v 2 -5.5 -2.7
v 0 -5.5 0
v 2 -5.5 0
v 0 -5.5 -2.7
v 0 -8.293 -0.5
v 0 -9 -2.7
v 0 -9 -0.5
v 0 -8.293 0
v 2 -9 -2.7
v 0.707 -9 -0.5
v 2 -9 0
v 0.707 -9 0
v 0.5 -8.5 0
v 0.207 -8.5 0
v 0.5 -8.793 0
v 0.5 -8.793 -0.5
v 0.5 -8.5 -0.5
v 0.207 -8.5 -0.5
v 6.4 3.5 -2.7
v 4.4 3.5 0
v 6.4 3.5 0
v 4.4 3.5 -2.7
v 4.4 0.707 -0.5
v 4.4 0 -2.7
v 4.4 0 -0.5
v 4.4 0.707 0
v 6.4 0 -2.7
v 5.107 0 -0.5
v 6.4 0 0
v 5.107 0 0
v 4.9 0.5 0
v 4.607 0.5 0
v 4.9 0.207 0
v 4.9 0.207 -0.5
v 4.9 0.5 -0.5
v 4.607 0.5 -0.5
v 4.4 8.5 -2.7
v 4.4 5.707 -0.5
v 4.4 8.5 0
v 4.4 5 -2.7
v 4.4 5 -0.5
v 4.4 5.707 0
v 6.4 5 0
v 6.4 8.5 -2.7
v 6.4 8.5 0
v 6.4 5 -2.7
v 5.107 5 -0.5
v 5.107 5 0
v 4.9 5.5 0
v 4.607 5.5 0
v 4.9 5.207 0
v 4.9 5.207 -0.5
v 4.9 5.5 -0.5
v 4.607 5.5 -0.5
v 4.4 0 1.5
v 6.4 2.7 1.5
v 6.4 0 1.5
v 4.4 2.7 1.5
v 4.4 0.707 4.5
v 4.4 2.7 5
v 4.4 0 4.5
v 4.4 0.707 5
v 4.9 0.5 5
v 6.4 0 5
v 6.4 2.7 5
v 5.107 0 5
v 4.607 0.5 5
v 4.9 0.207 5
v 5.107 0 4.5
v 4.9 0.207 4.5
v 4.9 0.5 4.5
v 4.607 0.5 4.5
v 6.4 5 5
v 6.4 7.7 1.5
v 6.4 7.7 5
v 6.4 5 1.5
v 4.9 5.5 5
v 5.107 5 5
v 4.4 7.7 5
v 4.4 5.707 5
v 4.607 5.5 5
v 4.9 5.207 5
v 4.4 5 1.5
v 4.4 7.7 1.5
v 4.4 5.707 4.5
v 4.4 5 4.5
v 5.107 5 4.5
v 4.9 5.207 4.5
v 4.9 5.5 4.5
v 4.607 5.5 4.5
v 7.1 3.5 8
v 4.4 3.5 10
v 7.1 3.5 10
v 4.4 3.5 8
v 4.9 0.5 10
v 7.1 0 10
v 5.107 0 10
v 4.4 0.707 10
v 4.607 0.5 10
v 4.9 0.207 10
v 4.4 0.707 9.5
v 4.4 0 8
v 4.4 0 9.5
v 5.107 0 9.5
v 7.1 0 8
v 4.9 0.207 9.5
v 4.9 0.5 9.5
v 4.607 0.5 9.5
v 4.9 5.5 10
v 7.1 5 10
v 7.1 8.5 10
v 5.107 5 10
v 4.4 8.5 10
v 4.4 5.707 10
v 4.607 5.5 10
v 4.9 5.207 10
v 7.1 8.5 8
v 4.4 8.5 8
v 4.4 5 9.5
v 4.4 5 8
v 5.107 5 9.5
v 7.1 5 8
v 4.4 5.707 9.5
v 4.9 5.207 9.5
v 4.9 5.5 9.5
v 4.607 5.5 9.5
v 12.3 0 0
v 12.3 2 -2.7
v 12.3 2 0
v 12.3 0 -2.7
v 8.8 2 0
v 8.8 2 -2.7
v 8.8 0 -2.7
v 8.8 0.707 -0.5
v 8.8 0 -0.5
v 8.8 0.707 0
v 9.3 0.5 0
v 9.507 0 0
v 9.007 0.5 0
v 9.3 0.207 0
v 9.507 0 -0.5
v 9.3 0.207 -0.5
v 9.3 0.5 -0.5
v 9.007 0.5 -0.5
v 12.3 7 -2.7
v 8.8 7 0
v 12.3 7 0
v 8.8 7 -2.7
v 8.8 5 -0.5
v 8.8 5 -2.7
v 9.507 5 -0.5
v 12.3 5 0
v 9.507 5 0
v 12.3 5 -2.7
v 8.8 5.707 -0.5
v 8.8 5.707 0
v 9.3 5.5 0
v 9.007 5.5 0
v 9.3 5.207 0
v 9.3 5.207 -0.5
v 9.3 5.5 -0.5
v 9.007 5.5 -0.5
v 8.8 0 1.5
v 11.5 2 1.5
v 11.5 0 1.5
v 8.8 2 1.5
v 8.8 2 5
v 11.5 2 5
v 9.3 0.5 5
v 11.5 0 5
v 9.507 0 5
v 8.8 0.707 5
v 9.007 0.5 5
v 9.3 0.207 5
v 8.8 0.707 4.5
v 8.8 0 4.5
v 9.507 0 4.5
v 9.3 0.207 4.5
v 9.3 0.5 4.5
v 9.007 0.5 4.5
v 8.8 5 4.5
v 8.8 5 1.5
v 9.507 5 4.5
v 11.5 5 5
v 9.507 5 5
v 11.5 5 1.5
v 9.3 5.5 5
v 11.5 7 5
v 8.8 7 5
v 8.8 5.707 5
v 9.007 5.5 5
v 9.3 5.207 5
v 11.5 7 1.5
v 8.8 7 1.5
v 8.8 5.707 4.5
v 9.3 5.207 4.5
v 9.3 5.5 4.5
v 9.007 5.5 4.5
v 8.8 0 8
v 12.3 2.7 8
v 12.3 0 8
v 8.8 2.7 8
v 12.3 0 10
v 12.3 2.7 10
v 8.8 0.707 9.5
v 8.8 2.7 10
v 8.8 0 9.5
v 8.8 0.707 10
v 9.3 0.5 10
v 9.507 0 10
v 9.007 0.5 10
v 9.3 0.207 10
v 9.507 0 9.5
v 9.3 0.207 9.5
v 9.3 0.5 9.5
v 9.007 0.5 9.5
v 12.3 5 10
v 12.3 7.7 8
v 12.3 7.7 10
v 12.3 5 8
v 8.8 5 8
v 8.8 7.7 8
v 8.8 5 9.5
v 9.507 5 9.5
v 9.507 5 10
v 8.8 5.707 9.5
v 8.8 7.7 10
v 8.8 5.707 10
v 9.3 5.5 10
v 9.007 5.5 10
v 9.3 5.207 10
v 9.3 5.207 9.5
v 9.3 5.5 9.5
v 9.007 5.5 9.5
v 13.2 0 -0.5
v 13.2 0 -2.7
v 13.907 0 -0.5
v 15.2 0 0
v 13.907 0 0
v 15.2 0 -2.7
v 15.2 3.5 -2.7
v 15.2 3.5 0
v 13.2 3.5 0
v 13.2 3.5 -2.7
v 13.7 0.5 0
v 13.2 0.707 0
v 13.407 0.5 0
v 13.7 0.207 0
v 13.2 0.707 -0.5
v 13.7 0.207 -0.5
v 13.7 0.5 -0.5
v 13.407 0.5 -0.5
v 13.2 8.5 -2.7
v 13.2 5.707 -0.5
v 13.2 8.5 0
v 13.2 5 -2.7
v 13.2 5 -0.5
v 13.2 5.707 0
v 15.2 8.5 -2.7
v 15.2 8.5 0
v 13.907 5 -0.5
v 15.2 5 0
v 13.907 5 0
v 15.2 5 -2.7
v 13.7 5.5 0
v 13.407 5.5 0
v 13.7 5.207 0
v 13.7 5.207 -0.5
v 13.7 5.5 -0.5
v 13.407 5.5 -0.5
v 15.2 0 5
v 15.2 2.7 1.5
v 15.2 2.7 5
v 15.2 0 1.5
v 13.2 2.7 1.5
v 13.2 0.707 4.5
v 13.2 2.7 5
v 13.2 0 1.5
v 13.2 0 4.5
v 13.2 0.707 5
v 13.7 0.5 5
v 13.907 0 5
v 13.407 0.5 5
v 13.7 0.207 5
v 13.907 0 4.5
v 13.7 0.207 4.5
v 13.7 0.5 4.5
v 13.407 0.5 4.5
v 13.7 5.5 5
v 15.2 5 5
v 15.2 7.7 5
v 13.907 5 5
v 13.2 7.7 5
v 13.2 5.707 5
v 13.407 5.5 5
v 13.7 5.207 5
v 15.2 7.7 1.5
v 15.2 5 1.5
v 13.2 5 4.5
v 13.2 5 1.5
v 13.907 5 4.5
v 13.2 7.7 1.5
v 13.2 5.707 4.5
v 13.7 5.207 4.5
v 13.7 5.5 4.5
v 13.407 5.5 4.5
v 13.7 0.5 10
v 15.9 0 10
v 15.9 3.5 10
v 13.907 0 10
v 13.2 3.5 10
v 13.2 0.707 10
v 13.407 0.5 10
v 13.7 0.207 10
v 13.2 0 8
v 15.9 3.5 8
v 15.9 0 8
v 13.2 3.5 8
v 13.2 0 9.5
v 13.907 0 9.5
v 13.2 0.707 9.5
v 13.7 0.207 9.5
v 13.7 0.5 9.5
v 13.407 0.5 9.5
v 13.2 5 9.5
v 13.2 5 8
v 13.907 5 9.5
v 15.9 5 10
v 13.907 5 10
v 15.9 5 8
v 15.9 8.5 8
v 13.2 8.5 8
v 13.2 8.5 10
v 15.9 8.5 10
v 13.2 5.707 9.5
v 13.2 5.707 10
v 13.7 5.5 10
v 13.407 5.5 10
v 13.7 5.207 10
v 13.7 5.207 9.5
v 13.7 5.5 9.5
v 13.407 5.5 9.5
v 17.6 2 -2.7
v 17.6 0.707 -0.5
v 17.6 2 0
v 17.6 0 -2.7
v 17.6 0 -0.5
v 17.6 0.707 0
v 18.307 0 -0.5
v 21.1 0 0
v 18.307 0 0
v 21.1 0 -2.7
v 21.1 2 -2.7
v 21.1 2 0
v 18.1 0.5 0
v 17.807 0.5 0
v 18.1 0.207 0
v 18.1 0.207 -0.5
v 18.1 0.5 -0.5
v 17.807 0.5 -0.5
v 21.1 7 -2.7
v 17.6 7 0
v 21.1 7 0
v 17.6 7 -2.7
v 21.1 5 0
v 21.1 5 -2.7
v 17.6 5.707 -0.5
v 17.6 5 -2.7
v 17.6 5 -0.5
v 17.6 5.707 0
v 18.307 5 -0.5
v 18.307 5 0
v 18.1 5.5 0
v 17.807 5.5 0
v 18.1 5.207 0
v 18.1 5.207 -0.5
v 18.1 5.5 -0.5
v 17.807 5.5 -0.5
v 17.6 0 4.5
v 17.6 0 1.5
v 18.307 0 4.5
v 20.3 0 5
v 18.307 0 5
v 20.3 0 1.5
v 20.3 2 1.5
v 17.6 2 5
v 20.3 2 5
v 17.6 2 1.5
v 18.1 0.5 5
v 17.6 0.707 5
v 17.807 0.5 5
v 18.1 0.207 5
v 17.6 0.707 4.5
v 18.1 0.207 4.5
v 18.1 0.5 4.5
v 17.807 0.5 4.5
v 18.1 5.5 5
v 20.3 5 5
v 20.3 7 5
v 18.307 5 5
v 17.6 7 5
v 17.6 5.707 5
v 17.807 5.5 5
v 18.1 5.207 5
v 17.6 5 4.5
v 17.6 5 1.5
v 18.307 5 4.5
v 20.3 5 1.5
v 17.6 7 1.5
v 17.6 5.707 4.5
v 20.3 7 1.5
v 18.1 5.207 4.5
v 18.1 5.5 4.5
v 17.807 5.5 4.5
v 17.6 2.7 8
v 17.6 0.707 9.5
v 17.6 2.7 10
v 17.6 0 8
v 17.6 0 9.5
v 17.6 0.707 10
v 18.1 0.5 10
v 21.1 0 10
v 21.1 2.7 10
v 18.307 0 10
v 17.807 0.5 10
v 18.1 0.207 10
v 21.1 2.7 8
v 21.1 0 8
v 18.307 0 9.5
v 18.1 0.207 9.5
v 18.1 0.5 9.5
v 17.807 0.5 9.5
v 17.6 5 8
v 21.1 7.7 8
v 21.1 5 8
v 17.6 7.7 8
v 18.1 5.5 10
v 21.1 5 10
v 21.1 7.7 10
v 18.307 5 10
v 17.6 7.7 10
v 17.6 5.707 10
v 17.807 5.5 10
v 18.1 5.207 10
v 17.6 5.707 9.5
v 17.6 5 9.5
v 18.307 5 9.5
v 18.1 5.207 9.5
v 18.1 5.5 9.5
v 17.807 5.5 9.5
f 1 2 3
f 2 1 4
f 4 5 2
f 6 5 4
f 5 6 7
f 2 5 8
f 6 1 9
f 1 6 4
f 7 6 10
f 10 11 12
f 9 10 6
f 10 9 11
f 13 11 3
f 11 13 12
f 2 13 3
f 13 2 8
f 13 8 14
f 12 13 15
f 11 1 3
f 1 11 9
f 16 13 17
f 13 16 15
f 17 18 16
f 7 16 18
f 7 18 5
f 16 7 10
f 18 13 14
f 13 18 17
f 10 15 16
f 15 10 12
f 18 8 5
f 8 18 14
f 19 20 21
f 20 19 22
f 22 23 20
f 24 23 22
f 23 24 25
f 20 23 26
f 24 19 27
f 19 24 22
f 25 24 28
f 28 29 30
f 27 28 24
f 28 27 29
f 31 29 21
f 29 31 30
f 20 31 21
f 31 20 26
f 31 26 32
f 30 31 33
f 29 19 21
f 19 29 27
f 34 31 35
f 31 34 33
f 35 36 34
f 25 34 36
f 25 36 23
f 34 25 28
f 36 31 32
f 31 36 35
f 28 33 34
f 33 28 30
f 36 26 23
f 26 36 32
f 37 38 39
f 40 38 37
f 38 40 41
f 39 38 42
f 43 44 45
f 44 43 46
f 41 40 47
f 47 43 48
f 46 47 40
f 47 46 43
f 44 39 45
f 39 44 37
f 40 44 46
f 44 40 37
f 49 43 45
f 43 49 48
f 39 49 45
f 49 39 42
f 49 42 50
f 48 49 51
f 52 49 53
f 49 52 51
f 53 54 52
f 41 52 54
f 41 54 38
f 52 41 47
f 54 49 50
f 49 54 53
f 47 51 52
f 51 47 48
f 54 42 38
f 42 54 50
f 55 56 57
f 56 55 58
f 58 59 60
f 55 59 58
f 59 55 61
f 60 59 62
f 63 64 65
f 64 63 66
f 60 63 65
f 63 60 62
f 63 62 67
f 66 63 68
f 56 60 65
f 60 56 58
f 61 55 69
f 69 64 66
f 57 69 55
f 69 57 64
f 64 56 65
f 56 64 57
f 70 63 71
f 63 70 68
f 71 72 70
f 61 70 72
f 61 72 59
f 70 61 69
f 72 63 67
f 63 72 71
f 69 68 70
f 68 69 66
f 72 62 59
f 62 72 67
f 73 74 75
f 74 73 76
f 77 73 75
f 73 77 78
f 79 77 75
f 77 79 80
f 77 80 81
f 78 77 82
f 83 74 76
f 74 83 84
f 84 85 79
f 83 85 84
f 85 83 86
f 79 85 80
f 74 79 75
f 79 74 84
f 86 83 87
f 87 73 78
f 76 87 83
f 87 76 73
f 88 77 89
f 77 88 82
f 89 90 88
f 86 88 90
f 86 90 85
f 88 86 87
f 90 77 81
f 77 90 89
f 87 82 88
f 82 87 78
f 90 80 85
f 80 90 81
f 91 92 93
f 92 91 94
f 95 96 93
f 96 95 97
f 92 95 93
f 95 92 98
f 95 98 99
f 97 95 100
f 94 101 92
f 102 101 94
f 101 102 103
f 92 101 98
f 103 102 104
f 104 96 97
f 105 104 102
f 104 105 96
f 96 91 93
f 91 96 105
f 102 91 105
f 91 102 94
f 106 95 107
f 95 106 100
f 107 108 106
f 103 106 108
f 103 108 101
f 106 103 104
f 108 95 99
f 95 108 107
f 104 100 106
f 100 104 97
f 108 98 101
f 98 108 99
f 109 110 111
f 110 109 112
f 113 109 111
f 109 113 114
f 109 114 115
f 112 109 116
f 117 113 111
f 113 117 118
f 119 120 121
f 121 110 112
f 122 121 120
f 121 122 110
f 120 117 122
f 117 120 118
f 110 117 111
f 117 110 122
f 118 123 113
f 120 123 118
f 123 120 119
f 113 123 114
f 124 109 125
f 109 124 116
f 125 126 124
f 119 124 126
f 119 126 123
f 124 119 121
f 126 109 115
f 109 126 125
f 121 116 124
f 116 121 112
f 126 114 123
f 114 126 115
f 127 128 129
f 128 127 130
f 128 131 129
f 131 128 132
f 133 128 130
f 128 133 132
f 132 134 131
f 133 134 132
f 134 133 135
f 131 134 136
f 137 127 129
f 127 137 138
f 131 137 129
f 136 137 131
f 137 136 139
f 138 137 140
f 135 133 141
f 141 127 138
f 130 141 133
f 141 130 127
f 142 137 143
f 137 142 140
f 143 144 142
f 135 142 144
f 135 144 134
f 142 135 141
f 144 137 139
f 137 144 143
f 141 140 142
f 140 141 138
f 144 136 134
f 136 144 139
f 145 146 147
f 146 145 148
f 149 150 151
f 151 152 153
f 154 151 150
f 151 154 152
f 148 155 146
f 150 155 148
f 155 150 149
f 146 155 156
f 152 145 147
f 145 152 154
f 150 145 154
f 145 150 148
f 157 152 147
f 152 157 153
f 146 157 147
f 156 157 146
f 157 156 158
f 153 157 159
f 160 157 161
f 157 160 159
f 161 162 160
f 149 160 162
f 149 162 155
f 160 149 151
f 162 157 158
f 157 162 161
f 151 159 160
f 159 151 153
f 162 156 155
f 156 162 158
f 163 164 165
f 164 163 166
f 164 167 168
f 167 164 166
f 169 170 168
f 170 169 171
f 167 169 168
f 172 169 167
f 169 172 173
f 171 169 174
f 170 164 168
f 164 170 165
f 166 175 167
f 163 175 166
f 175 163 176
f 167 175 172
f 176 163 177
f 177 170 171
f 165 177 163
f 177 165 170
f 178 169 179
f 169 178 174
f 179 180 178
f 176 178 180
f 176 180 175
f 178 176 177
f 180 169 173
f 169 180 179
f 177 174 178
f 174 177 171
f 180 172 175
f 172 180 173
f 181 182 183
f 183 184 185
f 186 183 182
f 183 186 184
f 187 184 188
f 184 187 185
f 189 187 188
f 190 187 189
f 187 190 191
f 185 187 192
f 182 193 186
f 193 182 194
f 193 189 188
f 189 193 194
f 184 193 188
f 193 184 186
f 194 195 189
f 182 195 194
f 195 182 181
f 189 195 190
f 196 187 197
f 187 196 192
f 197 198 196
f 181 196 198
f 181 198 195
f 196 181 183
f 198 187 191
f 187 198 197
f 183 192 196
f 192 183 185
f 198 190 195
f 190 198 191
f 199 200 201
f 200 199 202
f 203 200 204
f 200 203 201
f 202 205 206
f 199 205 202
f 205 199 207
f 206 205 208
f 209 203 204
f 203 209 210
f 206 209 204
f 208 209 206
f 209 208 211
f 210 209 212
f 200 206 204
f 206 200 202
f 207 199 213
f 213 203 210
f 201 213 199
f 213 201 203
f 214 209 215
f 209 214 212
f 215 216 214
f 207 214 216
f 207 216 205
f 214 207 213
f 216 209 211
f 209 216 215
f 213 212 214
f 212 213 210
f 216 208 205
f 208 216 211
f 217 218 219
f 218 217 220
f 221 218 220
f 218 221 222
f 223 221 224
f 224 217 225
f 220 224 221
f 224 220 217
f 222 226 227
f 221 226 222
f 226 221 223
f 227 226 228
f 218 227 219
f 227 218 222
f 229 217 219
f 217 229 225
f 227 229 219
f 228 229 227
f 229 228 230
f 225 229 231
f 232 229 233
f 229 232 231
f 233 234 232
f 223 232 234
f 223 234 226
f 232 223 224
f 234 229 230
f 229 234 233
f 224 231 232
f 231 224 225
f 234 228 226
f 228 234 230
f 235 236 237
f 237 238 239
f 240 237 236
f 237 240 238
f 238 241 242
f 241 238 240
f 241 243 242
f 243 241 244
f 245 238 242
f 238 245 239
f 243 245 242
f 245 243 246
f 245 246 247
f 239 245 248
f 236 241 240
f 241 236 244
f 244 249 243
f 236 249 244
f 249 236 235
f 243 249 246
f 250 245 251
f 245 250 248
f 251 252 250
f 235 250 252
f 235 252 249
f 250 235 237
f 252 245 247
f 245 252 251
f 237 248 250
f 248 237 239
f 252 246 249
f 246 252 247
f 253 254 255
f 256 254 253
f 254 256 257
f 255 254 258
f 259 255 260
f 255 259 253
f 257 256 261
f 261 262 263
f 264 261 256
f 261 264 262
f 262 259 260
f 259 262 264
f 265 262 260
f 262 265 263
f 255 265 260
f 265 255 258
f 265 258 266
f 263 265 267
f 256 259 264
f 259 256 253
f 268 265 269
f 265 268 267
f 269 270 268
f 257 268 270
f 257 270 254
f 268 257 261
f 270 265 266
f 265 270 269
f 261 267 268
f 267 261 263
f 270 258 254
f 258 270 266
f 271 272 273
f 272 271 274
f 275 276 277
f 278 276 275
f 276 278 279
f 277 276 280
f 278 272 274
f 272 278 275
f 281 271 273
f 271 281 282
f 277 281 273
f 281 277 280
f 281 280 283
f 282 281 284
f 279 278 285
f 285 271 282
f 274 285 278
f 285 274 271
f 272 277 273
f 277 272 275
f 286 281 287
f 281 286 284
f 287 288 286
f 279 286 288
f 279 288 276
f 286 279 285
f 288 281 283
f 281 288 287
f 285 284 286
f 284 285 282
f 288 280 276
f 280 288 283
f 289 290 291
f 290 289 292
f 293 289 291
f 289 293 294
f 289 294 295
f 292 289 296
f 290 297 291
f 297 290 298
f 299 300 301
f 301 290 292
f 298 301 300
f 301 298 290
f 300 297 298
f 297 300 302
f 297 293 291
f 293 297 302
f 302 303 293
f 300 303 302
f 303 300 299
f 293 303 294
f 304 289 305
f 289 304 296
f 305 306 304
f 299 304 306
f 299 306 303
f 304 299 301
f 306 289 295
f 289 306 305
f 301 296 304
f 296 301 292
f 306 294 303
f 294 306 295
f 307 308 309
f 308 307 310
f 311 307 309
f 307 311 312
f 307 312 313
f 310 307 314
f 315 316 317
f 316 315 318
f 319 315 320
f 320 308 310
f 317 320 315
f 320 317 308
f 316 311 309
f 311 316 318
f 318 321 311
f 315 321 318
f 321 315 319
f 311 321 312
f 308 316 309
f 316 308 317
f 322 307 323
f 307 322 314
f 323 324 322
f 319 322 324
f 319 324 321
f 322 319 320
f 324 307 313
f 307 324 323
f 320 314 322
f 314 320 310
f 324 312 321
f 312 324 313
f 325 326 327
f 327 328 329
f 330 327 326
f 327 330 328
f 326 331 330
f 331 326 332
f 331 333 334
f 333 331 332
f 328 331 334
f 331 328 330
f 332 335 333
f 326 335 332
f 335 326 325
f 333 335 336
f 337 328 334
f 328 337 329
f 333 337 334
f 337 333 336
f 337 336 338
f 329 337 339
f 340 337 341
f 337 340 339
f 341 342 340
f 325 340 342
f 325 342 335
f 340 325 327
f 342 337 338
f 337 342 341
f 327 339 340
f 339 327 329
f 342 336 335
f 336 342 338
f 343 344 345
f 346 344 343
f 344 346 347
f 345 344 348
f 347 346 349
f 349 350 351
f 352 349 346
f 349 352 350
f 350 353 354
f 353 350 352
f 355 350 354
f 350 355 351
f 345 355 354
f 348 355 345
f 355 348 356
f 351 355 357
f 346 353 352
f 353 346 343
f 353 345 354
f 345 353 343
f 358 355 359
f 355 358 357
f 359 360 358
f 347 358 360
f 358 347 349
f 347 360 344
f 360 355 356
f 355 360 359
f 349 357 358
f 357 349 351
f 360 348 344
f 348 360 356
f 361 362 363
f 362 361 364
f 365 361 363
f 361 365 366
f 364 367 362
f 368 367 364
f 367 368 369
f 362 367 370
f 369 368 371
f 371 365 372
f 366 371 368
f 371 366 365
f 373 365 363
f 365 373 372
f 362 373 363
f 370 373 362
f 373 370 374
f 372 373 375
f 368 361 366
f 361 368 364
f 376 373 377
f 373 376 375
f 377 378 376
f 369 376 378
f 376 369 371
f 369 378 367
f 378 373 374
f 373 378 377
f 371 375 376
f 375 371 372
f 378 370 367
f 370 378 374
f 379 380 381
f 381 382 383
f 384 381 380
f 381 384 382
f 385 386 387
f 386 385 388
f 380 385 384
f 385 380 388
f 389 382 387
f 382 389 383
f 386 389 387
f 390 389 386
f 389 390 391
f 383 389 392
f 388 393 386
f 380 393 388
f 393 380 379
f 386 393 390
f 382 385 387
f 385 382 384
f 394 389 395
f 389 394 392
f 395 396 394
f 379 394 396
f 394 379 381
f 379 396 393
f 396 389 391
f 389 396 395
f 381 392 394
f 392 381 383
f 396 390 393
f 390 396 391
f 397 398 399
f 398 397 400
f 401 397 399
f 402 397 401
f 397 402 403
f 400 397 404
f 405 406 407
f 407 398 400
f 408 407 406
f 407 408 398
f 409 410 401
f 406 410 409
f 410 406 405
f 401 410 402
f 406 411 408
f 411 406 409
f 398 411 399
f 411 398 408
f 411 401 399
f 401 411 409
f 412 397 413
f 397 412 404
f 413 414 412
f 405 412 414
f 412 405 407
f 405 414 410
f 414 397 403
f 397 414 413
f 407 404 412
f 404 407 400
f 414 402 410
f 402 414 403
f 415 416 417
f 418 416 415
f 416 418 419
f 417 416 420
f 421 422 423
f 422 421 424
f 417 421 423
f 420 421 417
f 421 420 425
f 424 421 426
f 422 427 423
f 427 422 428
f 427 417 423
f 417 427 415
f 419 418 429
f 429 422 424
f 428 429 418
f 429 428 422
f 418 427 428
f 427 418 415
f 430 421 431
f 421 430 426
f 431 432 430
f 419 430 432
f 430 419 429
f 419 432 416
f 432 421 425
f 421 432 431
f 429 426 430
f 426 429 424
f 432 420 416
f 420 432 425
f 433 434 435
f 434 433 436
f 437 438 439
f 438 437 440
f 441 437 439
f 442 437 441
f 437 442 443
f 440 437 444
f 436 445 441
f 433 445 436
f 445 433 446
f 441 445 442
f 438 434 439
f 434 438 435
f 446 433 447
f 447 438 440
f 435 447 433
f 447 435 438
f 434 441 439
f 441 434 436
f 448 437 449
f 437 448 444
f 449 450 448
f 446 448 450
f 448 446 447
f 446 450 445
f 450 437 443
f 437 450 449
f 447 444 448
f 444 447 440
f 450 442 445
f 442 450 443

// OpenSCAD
// Start: lazy_union
default_5_default_5();
// End: lazy_union

// Modules.

// 'PartMaterial undef-default - undef-default'
module default_5_default_5() {
  // 'None : _combine_solids_and_holes'
  union() {
    // 'at_r0_0'
    multmatrix(m=[[1.0, 0.0, 0.0, 0.0], [0.0, 1.0, 0.0, -9.0], [0.0, 0.0, 1.0, 0.0], [0.0, 0.0, 0.0, 1.0]]) {
      // 'at_r0_0'
      color(c=[1.0, 0.0, 0.0, 1.0]) {
        // '_combine_solids_and_holes'
        difference() {
          // 'at_r0_0 : _combine_solids_and_holes'
          union() {
            // 'outer'
            multmatrix(m=[[1.0, 0.0, 0.0, 0.0], [0.0, 0.0, 1.0, 0.0], [-0.0, -1.0, -0.0, -0.0], [0.0, 0.0, 0.0, 1.0]]) {
              // 'outer : _combine_solids_and_holes'
              union() {
                // 'outer'
                cube(size=[2.0, 2.7, 3.5]);
              }
            }
          }
          // 'at_r0_0'
          multmatrix(m=[[1.0, 0.0, 0.0, -0.5], [0.0, 1.0, 0.0, -0.5], [0.0, 0.0, 1.0, -0.5], [0.0, 0.0, 0.0, 1.0]]) {
            // 'etch1 : _combine_solids_and_holes'
            union() {
              // 'etch1'
              cube(size=[1.0, 1.0, 1.0]);
            }
          }
          // 'at_r0_0'
          multmatrix(m=[[0.7071067811865475, 0.7071067811865475, 0.0, -0.7071067811865475], [-0.7071067811865475, 0.7071067811865475, 0.0, 0.0], [0.0, 0.0, 1.0, -0.5], [0.0, 0.0, 0.0, 1.0]]) {
            // 'etch2 : _combine_solids_and_holes'
            union() {
              // 'etch2'
              cube(size=[1.0, 1.0, 1.0]);
            }
          }
        }
      }
    }
    // 'at_0_0'
    multmatrix(m=[[1.0, 0.0, 0.0, 4.4], [0.0, 1.0, 0.0, 0.0], [0.0, 0.0, 1.0, 0.0], [0.0, 0.0, 0.0, 1.0]]) {
      // 'at_0_0'
      color(c=[1.0, 0.0, 0.0, 1.0]) {
        // '_combine_solids_and_holes'
        difference() {
          // 'at_0_0 : _combine_solids_and_holes'
          union() {
            // 'outer'
            multmatrix(m=[[1.0, 0.0, 0.0, 0.0], [0.0, 0.0, 1.0, 0.0], [-0.0, -1.0, -0.0, -0.0], [0.0, 0.0, 0.0, 1.0]]) {
              // 'outer : _combine_solids_and_holes'
              union() {
                // 'outer'
                cube(size=[2.0, 2.7, 3.5]);
              }
            }
          }
          // 'at_0_0'
          multmatrix(m=[[1.0, 0.0, 0.0, -0.5], [0.0, 1.0, 0.0, -0.5], [0.0, 0.0, 1.0, -0.5], [0.0, 0.0, 0.0, 1.0]]) {
            // 'etch1 : _combine_solids_and_holes'
            union() {
              // 'etch1'
              cube(size=[1.0, 1.0, 1.0]);
            }
          }
          // 'at_0_0'
          multmatrix(m=[[0.7071067811865475, 0.7071067811865475, 0.0, -0.7071067811865475], [-0.7071067811865475, 0.7071067811865475, 0.0, 0.0], [0.0, 0.0, 1.0, -0.5], [0.0, 0.0, 0.0, 1.0]]) {
            // 'etch2 : _combine_solids_and_holes'
            union() {
              // 'etch2'
              cube(size=[1.0, 1.0, 1.0]);
            }
          }
        }
      }
    }
    // 'at_3_0'
    multmatrix(m=[[1.0, 0.0, 0.0, 4.4], [0.0, 1.0, 0.0, 5.0], [0.0, 0.0, 1.0, 0.0], [0.0, 0.0, 0.0, 1.0]]) {
      // 'at_3_0'
      color(c=[1.0, 1.0, 0.0, 1.0]) {
        // '_combine_solids_and_holes'
        difference() {
          // 'at_3_0 : _combine_solids_and_holes'
          union() {
            // 'outer'
            multmatrix(m=[[1.0, 0.0, 0.0, 0.0], [-0.0, -0.0, -1.0, 3.5], [0.0, 1.0, 0.0, -2.7], [0.0, 0.0, 0.0, 1.0]]) {
              // 'outer : _combine_solids_and_holes'
              union() {
                // 'outer'
                cube(size=[2.0, 2.7, 3.5]);
              }
            }
          }
          // 'at_3_0'
          multmatrix(m=[[1.0, 0.0, 0.0, -0.5], [0.0, 1.0, 0.0, -0.5], [0.0, 0.0, 1.0, -0.5], [0.0, 0.0, 0.0, 1.0]]) {
            // 'etch1 : _combine_solids_and_holes'
            union() {
              // 'etch1'
              cube(size=[1.0, 1.0, 1.0]);
            }
          }
          // 'at_3_0'
          multmatrix(m=[[0.7071067811865475, 0.7071067811865475, 0.0, -0.7071067811865475], [-0.7071067811865475, 0.7071067811865475, 0.0, 0.0], [0.0, 0.0, 1.0, -0.5], [0.0, 0.0, 0.0, 1.0]]) {
            // 'etch2 : _combine_solids_and_holes'
            union() {
              // 'etch2'
              cube(size=[1.0, 1.0, 1.0]);
            }
          }
        }
      }
    }
    // 'at_1_0'
    multmatrix(m=[[1.0, 0.0, 0.0, 4.4], [0.0, 1.0, 0.0, 0.0], [0.0, 0.0, 1.0, 5.0], [0.0, 0.0, 0.0, 1.0]]) {
      // 'at_1_0'
      color(c=[0.0, 1.0, 1.0, 1.0]) {
        // '_combine_solids_and_holes'
        difference() {
          // 'at_1_0 : _combine_solids_and_holes'
          union() {
            // 'outer'
            multmatrix(m=[[1.0, 0.0, 0.0, 0.0], [-0.0, -1.0, -0.0, 2.7], [-0.0, -0.0, -1.0, -0.0], [0.0, 0.0, 0.0, 1.0]]) {
              // 'outer : _combine_solids_and_holes'
              union() {
                // 'outer'
                cube(size=[2.0, 2.7, 3.5]);
              }
            }
          }
          // 'at_1_0'
          multmatrix(m=[[1.0, 0.0, 0.0, -0.5], [0.0, 1.0, 0.0, -0.5], [0.0, 0.0, 1.0, -0.5], [0.0, 0.0, 0.0, 1.0]]) {
            // 'etch1 : _combine_solids_and_holes'
            union() {
              // 'etch1'
              cube(size=[1.0, 1.0, 1.0]);
            }
          }
          // 'at_1_0'
          multmatrix(m=[[0.7071067811865475, 0.7071067811865475, 0.0, -0.7071067811865475], [-0.7071067811865475, 0.7071067811865475, 0.0, 0.0], [0.0, 0.0, 1.0, -0.5], [0.0, 0.0, 0.0, 1.0]]) {
            // 'etch2 : _combine_solids_and_holes'
            union() {
              // 'etch2'
              cube(size=[1.0, 1.0, 1.0]);
            }
          }
        }
      }
    }
    // 'at_4_0'
    multmatrix(m=[[1.0, 0.0, 0.0, 4.4], [0.0, 1.0, 0.0, 5.0], [0.0, 0.0, 1.0, 5.0], [0.0, 0.0, 0.0, 1.0]]) {
      // 'at_4_0'
      color(c=[0.0, 0.0, 1.0, 1.0]) {
        // '_combine_solids_and_holes'
        difference() {
          // 'at_4_0 : _combine_solids_and_holes'
          union() {
            // 'outer'
            multmatrix(m=[[1.0, 0.0, 0.0, 0.0], [0.0, 1.0, 0.0, 0.0], [0.0, 0.0, 1.0, -3.5], [0.0, 0.0, 0.0, 1.0]]) {
              // 'outer : _combine_solids_and_holes'
              union() {
                // 'outer'
                cube(size=[2.0, 2.7, 3.5]);
              }
            }
          }
          // 'at_4_0'
          multmatrix(m=[[1.0, 0.0, 0.0, -0.5], [0.0, 1.0, 0.0, -0.5], [0.0, 0.0, 1.0, -0.5], [0.0, 0.0, 0.0, 1.0]]) {
            // 'etch1 : _combine_solids_and_holes'
            union() {
              // 'etch1'
              cube(size=[1.0, 1.0, 1.0]);
            }
          }
          // 'at_4_0'
          multmatrix(m=[[0.7071067811865475, 0.7071067811865475, 0.0, -0.7071067811865475], [-0.7071067811865475, 0.7071067811865475, 0.0, 0.0], [0.0, 0.0, 1.0, -0.5], [0.0, 0.0, 0.0, 1.0]]) {
            // 'etch2 : _combine_solids_and_holes'
            union() {
              // 'etch2'
              cube(size=[1.0, 1.0, 1.0]);
            }
          }
        }
      }
    }
    // 'at_2_0'
    multmatrix(m=[[1.0, 0.0, 0.0, 4.4], [0.0, 1.0, 0.0, 0.0], [0.0, 0.0, 1.0, 10.0], [0.0, 0.0, 0.0, 1.0]]) {
      // 'at_2_0'
      color(c=[1.0, 0.0, 1.0, 1.0]) {
        // '_combine_solids_and_holes'
        difference() {
          // 'at_2_0 : _combine_solids_and_holes'
          union() {
            // 'outer'
            multmatrix(m=[[-0.0, -1.0, -0.0, 2.7], [0.0, 0.0, 1.0, 0.0], [-1.0, -0.0, -0.0, -0.0], [0.0, 0.0, 0.0, 1.0]]) {
              // 'outer : _combine_solids_and_holes'
              union() {
                // 'outer'
                cube(size=[2.0, 2.7, 3.5]);
              }
            }
          }
          // 'at_2_0'
          multmatrix(m=[[1.0, 0.0, 0.0, -0.5], [0.0, 1.0, 0.0, -0.5], [0.0, 0.0, 1.0, -0.5], [0.0, 0.0, 0.0, 1.0]]) {
            // 'etch1 : _combine_solids_and_holes'
            union() {
              // 'etch1'
              cube(size=[1.0, 1.0, 1.0]);
            }
          }
          // 'at_2_0'
          multmatrix(m=[[0.7071067811865475, 0.7071067811865475, 0.0, -0.7071067811865475], [-0.7071067811865475, 0.7071067811865475, 0.0, 0.0], [0.0, 0.0, 1.0, -0.5], [0.0, 0.0, 0.0, 1.0]]) {
            // 'etch2 : _combine_solids_and_holes'
            union() {
              // 'etch2'
              cube(size=[1.0, 1.0, 1.0]);
            }
          }
        }
      }
    }
    // 'at_5_0'
    multmatrix(m=[[1.0, 0.0, 0.0, 4.4], [0.0, 1.0, 0.0, 5.0], [0.0, 0.0, 1.0, 10.0], [0.0, 0.0, 0.0, 1.0]]) {
      // 'at_5_0'
      color(c=[0.0, 1.0, 0.0, 1.0]) {
        // '_combine_solids_and_holes'
        difference() {
          // 'at_5_0 : _combine_solids_and_holes'
          union() {
            // 'outer'
            multmatrix(m=[[0.0, 1.0, 0.0, 0.0], [0.0, 0.0, 1.0, 0.0], [1.0, 0.0, 0.0, -2.0], [0.0, 0.0, 0.0, 1.0]]) {
              // 'outer : _combine_solids_and_holes'
              union() {
                // 'outer'
                cube(size=[2.0, 2.7, 3.5]);
              }
            }
          }
          // 'at_5_0'
          multmatrix(m=[[1.0, 0.0, 0.0, -0.5], [0.0, 1.0, 0.0, -0.5], [0.0, 0.0, 1.0, -0.5], [0.0, 0.0, 0.0, 1.0]]) {
            // 'etch1 : _combine_solids_and_holes'
            union() {
              // 'etch1'
              cube(size=[1.0, 1.0, 1.0]);
            }
          }
          // 'at_5_0'
          multmatrix(m=[[0.7071067811865475, 0.7071067811865475, 0.0, -0.7071067811865475], [-0.7071067811865475, 0.7071067811865475, 0.0, 0.0], [0.0, 0.0, 1.0, -0.5], [0.0, 0.0, 0.0, 1.0]]) {
            // 'etch2 : _combine_solids_and_holes'
            union() {
              // 'etch2'
              cube(size=[1.0, 1.0, 1.0]);
            }
          }
        }
      }
    }
    // 'at_0_1'
    multmatrix(m=[[1.0, 0.0, 0.0, 8.8], [0.0, 1.0, 0.0, 0.0], [0.0, 0.0, 1.0, 0.0], [0.0, 0.0, 0.0, 1.0]]) {
      // 'at_0_1'
      color(c=[0.0, 1.0, 0.0, 1.0]) {
        // '_combine_solids_and_holes'
        difference() {
          // 'at_0_1 : _combine_solids_and_holes'
          union() {
            // 'outer'
            multmatrix(m=[[0.0, 0.0, 1.0, 0.0], [-1.0, -0.0, -0.0, 2.0], [-0.0, -1.0, -0.0, -0.0], [0.0, 0.0, 0.0, 1.0]]) {
              // 'outer : _combine_solids_and_holes'
              union() {
                // 'outer'
                cube(size=[2.0, 2.7, 3.5]);
              }
            }
          }
          // 'at_0_1'
          multmatrix(m=[[1.0, 0.0, 0.0, -0.5], [0.0, 1.0, 0.0, -0.5], [0.0, 0.0, 1.0, -0.5], [0.0, 0.0, 0.0, 1.0]]) {
            // 'etch1 : _combine_solids_and_holes'
            union() {
              // 'etch1'
              cube(size=[1.0, 1.0, 1.0]);
            }
          }
          // 'at_0_1'
          multmatrix(m=[[0.7071067811865475, 0.7071067811865475, 0.0, -0.7071067811865475], [-0.7071067811865475, 0.7071067811865475, 0.0, 0.0], [0.0, 0.0, 1.0, -0.5], [0.0, 0.0, 0.0, 1.0]]) {
            // 'etch2 : _combine_solids_and_holes'
            union() {
              // 'etch2'
              cube(size=[1.0, 1.0, 1.0]);
            }
          }
        }
      }
    }
    // 'at_3_1'
    multmatrix(m=[[1.0, 0.0, 0.0, 8.8], [0.0, 1.0, 0.0, 5.0], [0.0, 0.0, 1.0, 0.0], [0.0, 0.0, 0.0, 1.0]]) {
      // 'at_3_1'
      color(c=[1.0, 0.0, 1.0, 1.0]) {
        // '_combine_solids_and_holes'
        difference() {
          // 'at_3_1 : _combine_solids_and_holes'
          union() {
            // 'outer'
            multmatrix(m=[[-0.0, -0.0, -1.0, 3.5], [-1.0, -0.0, -0.0, 2.0], [0.0, 1.0, 0.0, -2.7], [0.0, 0.0, 0.0, 1.0]]) {
              // 'outer : _combine_solids_and_holes'
              union() {
                // 'outer'
                cube(size=[2.0, 2.7, 3.5]);
              }
            }
          }
          // 'at_3_1'
          multmatrix(m=[[1.0, 0.0, 0.0, -0.5], [0.0, 1.0, 0.0, -0.5], [0.0, 0.0, 1.0, -0.5], [0.0, 0.0, 0.0, 1.0]]) {
            // 'etch1 : _combine_solids_and_holes'
            union() {
              // 'etch1'
              cube(size=[1.0, 1.0, 1.0]);
            }
          }
          // 'at_3_1'
          multmatrix(m=[[0.7071067811865475, 0.7071067811865475, 0.0, -0.7071067811865475], [-0.7071067811865475, 0.7071067811865475, 0.0, 0.0], [0.0, 0.0, 1.0, -0.5], [0.0, 0.0, 0.0, 1.0]]) {
            // 'etch2 : _combine_solids_and_holes'
            union() {
              // 'etch2'
              cube(size=[1.0, 1.0, 1.0]);
            }
          }
        }
      }
    }
    // 'at_1_1'
    multmatrix(m=[[1.0, 0.0, 0.0, 8.8], [0.0, 1.0, 0.0, 0.0], [0.0, 0.0, 1.0, 5.0], [0.0, 0.0, 0.0, 1.0]]) {
      // 'at_1_1'
      color(c=[1.0, 0.0, 0.0, 1.0]) {
        // '_combine_solids_and_holes'
        difference() {
          // 'at_1_1 : _combine_solids_and_holes'
          union() {
            // 'outer'
            multmatrix(m=[[-0.0, -1.0, -0.0, 2.7], [-1.0, -0.0, -0.0, 2.0], [-0.0, -0.0, -1.0, -0.0], [0.0, 0.0, 0.0, 1.0]]) {
              // 'outer : _combine_solids_and_holes'
              union() {
                // 'outer'
                cube(size=[2.0, 2.7, 3.5]);
              }
            }
          }
          // 'at_1_1'
          multmatrix(m=[[1.0, 0.0, 0.0, -0.5], [0.0, 1.0, 0.0, -0.5], [0.0, 0.0, 1.0, -0.5], [0.0, 0.0, 0.0, 1.0]]) {
            // 'etch1 : _combine_solids_and_holes'
            union() {
              // 'etch1'
              cube(size=[1.0, 1.0, 1.0]);
            }
          }
          // 'at_1_1'
          multmatrix(m=[[0.7071067811865475, 0.7071067811865475, 0.0, -0.7071067811865475], [-0.7071067811865475, 0.7071067811865475, 0.0, 0.0], [0.0, 0.0, 1.0, -0.5], [0.0, 0.0, 0.0, 1.0]]) {
            // 'etch2 : _combine_solids_and_holes'
            union() {
              // 'etch2'
              cube(size=[1.0, 1.0, 1.0]);
            }
          }
        }
      }
    }
    // 'at_4_1'
    multmatrix(m=[[1.0, 0.0, 0.0, 8.8], [0.0, 1.0, 0.0, 5.0], [0.0, 0.0, 1.0, 5.0], [0.0, 0.0, 0.0, 1.0]]) {
      // 'at_4_1'
      color(c=[1.0, 1.0, 0.0, 1.0]) {
        // '_combine_solids_and_holes'
        difference() {
          // 'at_4_1 : _combine_solids_and_holes'
          union() {
            // 'outer'
            multmatrix(m=[[0.0, 1.0, 0.0, 0.0], [-1.0, -0.0, -0.0, 2.0], [0.0, 0.0, 1.0, -3.5], [0.0, 0.0, 0.0, 1.0]]) {
              // 'outer : _combine_solids_and_holes'
              union() {
                // 'outer'
                cube(size=[2.0, 2.7, 3.5]);
              }
            }
          }
          // 'at_4_1'
          multmatrix(m=[[1.0, 0.0, 0.0, -0.5], [0.0, 1.0, 0.0, -0.5], [0.0, 0.0, 1.0, -0.5], [0.0, 0.0, 0.0, 1.0]]) {
            // 'etch1 : _combine_solids_and_holes'
            union() {
              // 'etch1'
              cube(size=[1.0, 1.0, 1.0]);
            }
          }
          // 'at_4_1'
          multmatrix(m=[[0.7071067811865475, 0.7071067811865475, 0.0, -0.7071067811865475], [-0.7071067811865475, 0.7071067811865475, 0.0, 0.0], [0.0, 0.0, 1.0, -0.5], [0.0, 0.0, 0.0, 1.0]]) {
            // 'etch2 : _combine_solids_and_holes'
            union() {
              // 'etch2'
              cube(size=[1.0, 1.0, 1.0]);
            }
          }
        }
      }
    }
    // 'at_2_1'
    multmatrix(m=[[1.0, 0.0, 0.0, 8.8], [0.0, 1.0, 0.0, 0.0], [0.0, 0.0, 1.0, 10.0], [0.0, 0.0, 0.0, 1.0]]) {
      // 'at_2_1'
      color(c=[0.0, 1.0, 1.0, 1.0]) {
        // '_combine_solids_and_holes'
        difference() {
          // 'at_2_1 : _combine_solids_and_holes'
          union() {
            // 'outer'
            multmatrix(m=[[0.0, 0.0, 1.0, 0.0], [0.0, 1.0, 0.0, 0.0], [-1.0, -0.0, -0.0, -0.0], [0.0, 0.0, 0.0, 1.0]]) {
              // 'outer : _combine_solids_and_holes'
              union() {
                // 'outer'
                cube(size=[2.0, 2.7, 3.5]);
              }
            }
          }
          // 'at_2_1'
          multmatrix(m=[[1.0, 0.0, 0.0, -0.5], [0.0, 1.0, 0.0, -0.5], [0.0, 0.0, 1.0, -0.5], [0.0, 0.0, 0.0, 1.0]]) {
            // 'etch1 : _combine_solids_and_holes'
            union() {
              // 'etch1'
              cube(size=[1.0, 1.0, 1.0]);
            }
          }
          // 'at_2_1'
          multmatrix(m=[[0.7071067811865475, 0.7071067811865475, 0.0, -0.7071067811865475], [-0.7071067811865475, 0.7071067811865475, 0.0, 0.0], [0.0, 0.0, 1.0, -0.5], [0.0, 0.0, 0.0, 1.0]]) {
            // 'etch2 : _combine_solids_and_holes'
            union() {
              // 'etch2'
              cube(size=[1.0, 1.0, 1.0]);
            }
          }
        }
      }
    }
    // 'at_5_1'
    multmatrix(m=[[1.0, 0.0, 0.0, 8.8], [0.0, 1.0, 0.0, 5.0], [0.0, 0.0, 1.0, 10.0], [0.0, 0.0, 0.0, 1.0]]) {
      // 'at_5_1'
      color(c=[0.0, 0.0, 1.0, 1.0]) {
        // '_combine_solids_and_holes'
        difference() {
          // 'at_5_1 : _combine_solids_and_holes'
          union() {
            // 'outer'
            multmatrix(m=[[0.0, 0.0, 1.0, 0.0], [-0.0, -1.0, -0.0, 2.7], [1.0, 0.0, 0.0, -2.0], [0.0, 0.0, 0.0, 1.0]]) {
              // 'outer : _combine_solids_and_holes'
              union() {
                // 'outer'
                cube(size=[2.0, 2.7, 3.5]);
              }
            }
          }
          // 'at_5_1'
          multmatrix(m=[[1.0, 0.0, 0.0, -0.5], [0.0, 1.0, 0.0, -0.5], [0.0, 0.0, 1.0, -0.5], [0.0, 0.0, 0.0, 1.0]]) {
            // 'etch1 : _combine_solids_and_holes'
            union() {
              // 'etch1'
              cube(size=[1.0, 1.0, 1.0]);
            }
          }
          // 'at_5_1'
          multmatrix(m=[[0.7071067811865475, 0.7071067811865475, 0.0, -0.7071067811865475], [-0.7071067811865475, 0.7071067811865475, 0.0, 0.0], [0.0, 0.0, 1.0, -0.5], [0.0, 0.0, 0.0, 1.0]]) {
            // 'etch2 : _combine_solids_and_holes'
            union() {
              // 'etch2'
              cube(size=[1.0, 1.0, 1.0]);
            }
          }
        }
      }
    }
    // 'at_0_2'
    multmatrix(m=[[1.0, 0.0, 0.0, 13.200000000000001], [0.0, 1.0, 0.0, 0.0], [0.0, 0.0, 1.0, 0.0], [0.0, 0.0, 0.0, 1.0]]) {
      // 'at_0_2'
      color(c=[0.0, 0.0, 1.0, 1.0]) {
        // '_combine_solids_and_holes'
        difference() {
          // 'at_0_2 : _combine_solids_and_holes'
          union() {
            // 'outer'
            multmatrix(m=[[-1.0, -0.0, -0.0, 2.0], [-0.0, -0.0, -1.0, 3.5], [-0.0, -1.0, -0.0, -0.0], [0.0, 0.0, 0.0, 1.0]]) {
              // 'outer : _combine_solids_and_holes'
              union() {
                // 'outer'
                cube(size=[2.0, 2.7, 3.5]);
              }
            }
          }
          // 'at_0_2'
          multmatrix(m=[[1.0, 0.0, 0.0, -0.5], [0.0, 1.0, 0.0, -0.5], [0.0, 0.0, 1.0, -0.5], [0.0, 0.0, 0.0, 1.0]]) {
            // 'etch1 : _combine_solids_and_holes'
            union() {
              // 'etch1'
              cube(size=[1.0, 1.0, 1.0]);
            }
          }
          // 'at_0_2'
          multmatrix(m=[[0.7071067811865475, 0.7071067811865475, 0.0, -0.7071067811865475], [-0.7071067811865475, 0.7071067811865475, 0.0, 0.0], [0.0, 0.0, 1.0, -0.5], [0.0, 0.0, 0.0, 1.0]]) {
            // 'etch2 : _combine_solids_and_holes'
            union() {
              // 'etch2'
              cube(size=[1.0, 1.0, 1.0]);
            }
          }
        }
      }
    }
    // 'at_3_2'
    multmatrix(m=[[1.0, 0.0, 0.0, 13.200000000000001], [0.0, 1.0, 0.0, 5.0], [0.0, 0.0, 1.0, 0.0], [0.0, 0.0, 0.0, 1.0]]) {
      // 'at_3_2'
      color(c=[0.0, 1.0, 1.0, 1.0]) {
        // '_combine_solids_and_holes'
        difference() {
          // 'at_3_2 : _combine_solids_and_holes'
          union() {
            // 'outer'
            multmatrix(m=[[-1.0, -0.0, -0.0, 2.0], [0.0, 0.0, 1.0, 0.0], [0.0, 1.0, 0.0, -2.7], [0.0, 0.0, 0.0, 1.0]]) {
              // 'outer : _combine_solids_and_holes'
              union() {
                // 'outer'
                cube(size=[2.0, 2.7, 3.5]);
              }
            }
          }
          // 'at_3_2'
          multmatrix(m=[[1.0, 0.0, 0.0, -0.5], [0.0, 1.0, 0.0, -0.5], [0.0, 0.0, 1.0, -0.5], [0.0, 0.0, 0.0, 1.0]]) {
            // 'etch1 : _combine_solids_and_holes'
            union() {
              // 'etch1'
              cube(size=[1.0, 1.0, 1.0]);
            }
          }
          // 'at_3_2'
          multmatrix(m=[[0.7071067811865475, 0.7071067811865475, 0.0, -0.7071067811865475], [-0.7071067811865475, 0.7071067811865475, 0.0, 0.0], [0.0, 0.0, 1.0, -0.5], [0.0, 0.0, 0.0, 1.0]]) {
            // 'etch2 : _combine_solids_and_holes'
            union() {
              // 'etch2'
              cube(size=[1.0, 1.0, 1.0]);
            }
          }
        }
      }
    }
    // 'at_1_2'
    multmatrix(m=[[1.0, 0.0, 0.0, 13.200000000000001], [0.0, 1.0, 0.0, 0.0], [0.0, 0.0, 1.0, 5.0], [0.0, 0.0, 0.0, 1.0]]) {
      // 'at_1_2'
      color(c=[0.0, 1.0, 0.0, 1.0]) {
        // '_combine_solids_and_holes'
        difference() {
          // 'at_1_2 : _combine_solids_and_holes'
          union() {
            // 'outer'
            multmatrix(m=[[-1.0, -0.0, -0.0, 2.0], [0.0, 1.0, 0.0, 0.0], [-0.0, -0.0, -1.0, -0.0], [0.0, 0.0, 0.0, 1.0]]) {
              // 'outer : _combine_solids_and_holes'
              union() {
                // 'outer'
                cube(size=[2.0, 2.7, 3.5]);
              }
            }
          }
          // 'at_1_2'
          multmatrix(m=[[1.0, 0.0, 0.0, -0.5], [0.0, 1.0, 0.0, -0.5], [0.0, 0.0, 1.0, -0.5], [0.0, 0.0, 0.0, 1.0]]) {
            // 'etch1 : _combine_solids_and_holes'
            union() {
              // 'etch1'
              cube(size=[1.0, 1.0, 1.0]);
            }
          }
          // 'at_1_2'
          multmatrix(m=[[0.7071067811865475, 0.7071067811865475, 0.0, -0.7071067811865475], [-0.7071067811865475, 0.7071067811865475, 0.0, 0.0], [0.0, 0.0, 1.0, -0.5], [0.0, 0.0, 0.0, 1.0]]) {
            // 'etch2 : _combine_solids_and_holes'
            union() {
              // 'etch2'
              cube(size=[1.0, 1.0, 1.0]);
            }
          }
        }
      }
    }
    // 'at_4_2'
    multmatrix(m=[[1.0, 0.0, 0.0, 13.200000000000001], [0.0, 1.0, 0.0, 5.0], [0.0, 0.0, 1.0, 5.0], [0.0, 0.0, 0.0, 1.0]]) {
      // 'at_4_2'
      color(c=[1.0, 0.0, 1.0, 1.0]) {
        // '_combine_solids_and_holes'
        difference() {
          // 'at_4_2 : _combine_solids_and_holes'
          union() {
            // 'outer'
            multmatrix(m=[[-1.0, -0.0, -0.0, 2.0], [-0.0, -1.0, -0.0, 2.7], [0.0, 0.0, 1.0, -3.5], [0.0, 0.0, 0.0, 1.0]]) {
              // 'outer : _combine_solids_and_holes'
              union() {
                // 'outer'
                cube(size=[2.0, 2.7, 3.5]);
              }
            }
          }
          // 'at_4_2'
          multmatrix(m=[[1.0, 0.0, 0.0, -0.5], [0.0, 1.0, 0.0, -0.5], [0.0, 0.0, 1.0, -0.5], [0.0, 0.0, 0.0, 1.0]]) {
            // 'etch1 : _combine_solids_and_holes'
            union() {
              // 'etch1'
              cube(size=[1.0, 1.0, 1.0]);
            }
          }
          // 'at_4_2'
          multmatrix(m=[[0.7071067811865475, 0.7071067811865475, 0.0, -0.7071067811865475], [-0.7071067811865475, 0.7071067811865475, 0.0, 0.0], [0.0, 0.0, 1.0, -0.5], [0.0, 0.0, 0.0, 1.0]]) {
            // 'etch2 : _combine_solids_and_holes'
            union() {
              // 'etch2'
              cube(size=[1.0, 1.0, 1.0]);
            }
          }
        }
      }
    }
    // 'at_2_2'
    multmatrix(m=[[1.0, 0.0, 0.0, 13.200000000000001], [0.0, 1.0, 0.0, 0.0], [0.0, 0.0, 1.0, 10.0], [0.0, 0.0, 0.0, 1.0]]) {
      // 'at_2_2'
      color(c=[1.0, 0.0, 0.0, 1.0]) {
        // '_combine_solids_and_holes'
        difference() {
          // 'at_2_2 : _combine_solids_and_holes'
          union() {
            // 'outer'
            multmatrix(m=[[0.0, 1.0, 0.0, 0.0], [-0.0, -0.0, -1.0, 3.5], [-1.0, -0.0, -0.0, -0.0], [0.0, 0.0, 0.0, 1.0]]) {
              // 'outer : _combine_solids_and_holes'
              union() {
                // 'outer'
                cube(size=[2.0, 2.7, 3.5]);
              }
            }
          }
          // 'at_2_2'
          multmatrix(m=[[1.0, 0.0, 0.0, -0.5], [0.0, 1.0, 0.0, -0.5], [0.0, 0.0, 1.0, -0.5], [0.0, 0.0, 0.0, 1.0]]) {
            // 'etch1 : _combine_solids_and_holes'
            union() {
              // 'etch1'
              cube(size=[1.0, 1.0, 1.0]);
            }
          }
          // 'at_2_2'
          multmatrix(m=[[0.7071067811865475, 0.7071067811865475, 0.0, -0.7071067811865475], [-0.7071067811865475, 0.7071067811865475, 0.0, 0.0], [0.0, 0.0, 1.0, -0.5], [0.0, 0.0, 0.0, 1.0]]) {
            // 'etch2 : _combine_solids_and_holes'
            union() {
              // 'etch2'
              cube(size=[1.0, 1.0, 1.0]);
            }
          }
        }
      }
    }
    // 'at_5_2'
    multmatrix(m=[[1.0, 0.0, 0.0, 13.200000000000001], [0.0, 1.0, 0.0, 5.0], [0.0, 0.0, 1.0, 10.0], [0.0, 0.0, 0.0, 1.0]]) {
      // 'at_5_2'
      color(c=[1.0, 1.0, 0.0, 1.0]) {
        // '_combine_solids_and_holes'
        difference() {
          // 'at_5_2 : _combine_solids_and_holes'
          union() {
            // 'outer'
            multmatrix(m=[[-0.0, -1.0, -0.0, 2.7], [-0.0, -0.0, -1.0, 3.5], [1.0, 0.0, 0.0, -2.0], [0.0, 0.0, 0.0, 1.0]]) {
              // 'outer : _combine_solids_and_holes'
              union() {
                // 'outer'
                cube(size=[2.0, 2.7, 3.5]);
              }
            }
          }
          // 'at_5_2'
          multmatrix(m=[[1.0, 0.0, 0.0, -0.5], [0.0, 1.0, 0.0, -0.5], [0.0, 0.0, 1.0, -0.5], [0.0, 0.0, 0.0, 1.0]]) {
            // 'etch1 : _combine_solids_and_holes'
            union() {
              // 'etch1'
              cube(size=[1.0, 1.0, 1.0]);
            }
          }
          // 'at_5_2'
          multmatrix(m=[[0.7071067811865475, 0.7071067811865475, 0.0, -0.7071067811865475], [-0.7071067811865475, 0.7071067811865475, 0.0, 0.0], [0.0, 0.0, 1.0, -0.5], [0.0, 0.0, 0.0, 1.0]]) {
            // 'etch2 : _combine_solids_and_holes'
            union() {
              // 'etch2'
              cube(size=[1.0, 1.0, 1.0]);
            }
          }
        }
      }
    }
    // 'at_0_3'
    multmatrix(m=[[1.0, 0.0, 0.0, 17.6], [0.0, 1.0, 0.0, 0.0], [0.0, 0.0, 1.0, 0.0], [0.0, 0.0, 0.0, 1.0]]) {
      // 'at_0_3'
      color(c=[1.0, 1.0, 0.0, 1.0]) {
        // '_combine_solids_and_holes'
        difference() {
          // 'at_0_3 : _combine_solids_and_holes'
          union() {
            // 'outer'
            multmatrix(m=[[-0.0, -0.0, -1.0, 3.5], [1.0, 0.0, 0.0, 0.0], [-0.0, -1.0, -0.0, -0.0], [0.0, 0.0, 0.0, 1.0]]) {
              // 'outer : _combine_solids_and_holes'
              union() {
                // 'outer'
                cube(size=[2.0, 2.7, 3.5]);
              }
            }
          }
          // 'at_0_3'
          multmatrix(m=[[1.0, 0.0, 0.0, -0.5], [0.0, 1.0, 0.0, -0.5], [0.0, 0.0, 1.0, -0.5], [0.0, 0.0, 0.0, 1.0]]) {
            // 'etch1 : _combine_solids_and_holes'
            union() {
              // 'etch1'
              cube(size=[1.0, 1.0, 1.0]);
            }
          }
          // 'at_0_3'
          multmatrix(m=[[0.7071067811865475, 0.7071067811865475, 0.0, -0.7071067811865475], [-0.7071067811865475, 0.7071067811865475, 0.0, 0.0], [0.0, 0.0, 1.0, -0.5], [0.0, 0.0, 0.0, 1.0]]) {
            // 'etch2 : _combine_solids_and_holes'
            union() {
              // 'etch2'
              cube(size=[1.0, 1.0, 1.0]);
            }
          }
        }
      }
    }
    // 'at_3_3'
    multmatrix(m=[[1.0, 0.0, 0.0, 17.6], [0.0, 1.0, 0.0, 5.0], [0.0, 0.0, 1.0, 0.0], [0.0, 0.0, 0.0, 1.0]]) {
      // 'at_3_3'
      color(c=[1.0, 0.0, 0.0, 1.0]) {
        // '_combine_solids_and_holes'
        difference() {
          // 'at_3_3 : _combine_solids_and_holes'
          union() {
            // 'outer'
            multmatrix(m=[[0.0, 0.0, 1.0, 0.0], [1.0, 0.0, 0.0, 0.0], [0.0, 1.0, 0.0, -2.7], [0.0, 0.0, 0.0, 1.0]]) {
              // 'outer : _combine_solids_and_holes'
              union() {
                // 'outer'
                cube(size=[2.0, 2.7, 3.5]);
              }
            }
          }
          // 'at_3_3'
          multmatrix(m=[[1.0, 0.0, 0.0, -0.5], [0.0, 1.0, 0.0, -0.5], [0.0, 0.0, 1.0, -0.5], [0.0, 0.0, 0.0, 1.0]]) {
            // 'etch1 : _combine_solids_and_holes'
            union() {
              // 'etch1'
              cube(size=[1.0, 1.0, 1.0]);
            }
          }
          // 'at_3_3'
          multmatrix(m=[[0.7071067811865475, 0.7071067811865475, 0.0, -0.7071067811865475], [-0.7071067811865475, 0.7071067811865475, 0.0, 0.0], [0.0, 0.0, 1.0, -0.5], [0.0, 0.0, 0.0, 1.0]]) {
            // 'etch2 : _combine_solids_and_holes'
            union() {
              // 'etch2'
              cube(size=[1.0, 1.0, 1.0]);
            }
          }
        }
      }
    }
    // 'at_1_3'
    multmatrix(m=[[1.0, 0.0, 0.0, 17.6], [0.0, 1.0, 0.0, 0.0], [0.0, 0.0, 1.0, 5.0], [0.0, 0.0, 0.0, 1.0]]) {
      // 'at_1_3'
      color(c=[0.0, 0.0, 1.0, 1.0]) {
        // '_combine_solids_and_holes'
        difference() {
          // 'at_1_3 : _combine_solids_and_holes'
          union() {
            // 'outer'
            multmatrix(m=[[0.0, 1.0, 0.0, 0.0], [1.0, 0.0, 0.0, 0.0], [-0.0, -0.0, -1.0, -0.0], [0.0, 0.0, 0.0, 1.0]]) {
              // 'outer : _combine_solids_and_holes'
              union() {
                // 'outer'
                cube(size=[2.0, 2.7, 3.5]);
              }
            }
          }
          // 'at_1_3'
          multmatrix(m=[[1.0, 0.0, 0.0, -0.5], [0.0, 1.0, 0.0, -0.5], [0.0, 0.0, 1.0, -0.5], [0.0, 0.0, 0.0, 1.0]]) {
            // 'etch1 : _combine_solids_and_holes'
            union() {
              // 'etch1'
              cube(size=[1.0, 1.0, 1.0]);
            }
          }
          // 'at_1_3'
          multmatrix(m=[[0.7071067811865475, 0.7071067811865475, 0.0, -0.7071067811865475], [-0.7071067811865475, 0.7071067811865475, 0.0, 0.0], [0.0, 0.0, 1.0, -0.5], [0.0, 0.0, 0.0, 1.0]]) {
            // 'etch2 : _combine_solids_and_holes'
            union() {
              // 'etch2'
              cube(size=[1.0, 1.0, 1.0]);
            }
          }
        }
      }
    }
    // 'at_4_3'
    multmatrix(m=[[1.0, 0.0, 0.0, 17.6], [0.0, 1.0, 0.0, 5.0], [0.0, 0.0, 1.0, 5.0], [0.0, 0.0, 0.0, 1.0]]) {
      // 'at_4_3'
      color(c=[0.0, 1.0, 1.0, 1.0]) {
        // '_combine_solids_and_holes'
        difference() {
          // 'at_4_3 : _combine_solids_and_holes'
          union() {
            // 'outer'
            multmatrix(m=[[-0.0, -1.0, -0.0, 2.7], [1.0, 0.0, 0.0, 0.0], [0.0, 0.0, 1.0, -3.5], [0.0, 0.0, 0.0, 1.0]]) {
              // 'outer : _combine_solids_and_holes'
              union() {
                // 'outer'
                cube(size=[2.0, 2.7, 3.5]);
              }
            }
          }
          // 'at_4_3'
          multmatrix(m=[[1.0, 0.0, 0.0, -0.5], [0.0, 1.0, 0.0, -0.5], [0.0, 0.0, 1.0, -0.5], [0.0, 0.0, 0.0, 1.0]]) {
            // 'etch1 : _combine_solids_and_holes'
            union() {
              // 'etch1'
              cube(size=[1.0, 1.0, 1.0]);
            }
          }
          // 'at_4_3'
          multmatrix(m=[[0.7071067811865475, 0.7071067811865475, 0.0, -0.7071067811865475], [-0.7071067811865475, 0.7071067811865475, 0.0, 0.0], [0.0, 0.0, 1.0, -0.5], [0.0, 0.0, 0.0, 1.0]]) {
            // 'etch2 : _combine_solids_and_holes'
            union() {
              // 'etch2'
              cube(size=[1.0, 1.0, 1.0]);
            }
          }
        }
      }
    }
    // 'at_2_3'
    multmatrix(m=[[1.0, 0.0, 0.0, 17.6], [0.0, 1.0, 0.0, 0.0], [0.0, 0.0, 1.0, 10.0], [0.0, 0.0, 0.0, 1.0]]) {
      // 'at_2_3'
      color(c=[0.0, 1.0, 0.0, 1.0]) {
        // '_combine_solids_and_holes'
        difference() {
          // 'at_2_3 : _combine_solids_and_holes'
          union() {
            // 'outer'
            multmatrix(m=[[-0.0, -0.0, -1.0, 3.5], [-0.0, -1.0, -0.0, 2.7], [-1.0, -0.0, -0.0, -0.0], [0.0, 0.0, 0.0, 1.0]]) {
              // 'outer : _combine_solids_and_holes'
              union() {
                // 'outer'
                cube(size=[2.0, 2.7, 3.5]);
              }
            }
          }
          // 'at_2_3'
          multmatrix(m=[[1.0, 0.0, 0.0, -0.5], [0.0, 1.0, 0.0, -0.5], [0.0, 0.0, 1.0, -0.5], [0.0, 0.0, 0.0, 1.0]]) {
            // 'etch1 : _combine_solids_and_holes'
            union() {
              // 'etch1'
              cube(size=[1.0, 1.0, 1.0]);
            }
          }
          // 'at_2_3'
          multmatrix(m=[[0.7071067811865475, 0.7071067811865475, 0.0, -0.7071067811865475], [-0.7071067811865475, 0.7071067811865475, 0.0, 0.0], [0.0, 0.0, 1.0, -0.5], [0.0, 0.0, 0.0, 1.0]]) {
            // 'etch2 : _combine_solids_and_holes'
            union() {
              // 'etch2'
              cube(size=[1.0, 1.0, 1.0]);
            }
          }
        }
      }
    }
    // 'at_5_3'
    multmatrix(m=[[1.0, 0.0, 0.0, 17.6], [0.0, 1.0, 0.0, 5.0], [0.0, 0.0, 1.0, 10.0], [0.0, 0.0, 0.0, 1.0]]) {
      // 'at_5_3'
      color(c=[1.0, 0.0, 1.0, 1.0]) {
        // '_combine_solids_and_holes'
        difference() {
          // 'at_5_3 : _combine_solids_and_holes'
          union() {
            // 'outer'
            multmatrix(m=[[-0.0, -0.0, -1.0, 3.5], [0.0, 1.0, 0.0, 0.0], [1.0, 0.0, 0.0, -2.0], [0.0, 0.0, 0.0, 1.0]]) {
              // 'outer : _combine_solids_and_holes'
              union() {
                // 'outer'
                cube(size=[2.0, 2.7, 3.5]);
              }
            }
          }
          // 'at_5_3'
          multmatrix(m=[[1.0, 0.0, 0.0, -0.5], [0.0, 1.0, 0.0, -0.5], [0.0, 0.0, 1.0, -0.5], [0.0, 0.0, 0.0, 1.0]]) {
            // 'etch1 : _combine_solids_and_holes'
            union() {
              // 'etch1'
              cube(size=[1.0, 1.0, 1.0]);
            }
          }
          // 'at_5_3'
          multmatrix(m=[[0.7071067811865475, 0.7071067811865475, 0.0, -0.7071067811865475], [-0.7071067811865475, 0.7071067811865475, 0.0, 0.0], [0.0, 0.0, 1.0, -0.5], [0.0, 0.0, 0.0, 1.0]]) {
            // 'etch2 : _combine_solids_and_holes'
            union() {
              // 'etch2'
              cube(size=[1.0, 1.0, 1.0]);
            }
          }
        }
      }
    }
  }
} // end module default_5_default_5
